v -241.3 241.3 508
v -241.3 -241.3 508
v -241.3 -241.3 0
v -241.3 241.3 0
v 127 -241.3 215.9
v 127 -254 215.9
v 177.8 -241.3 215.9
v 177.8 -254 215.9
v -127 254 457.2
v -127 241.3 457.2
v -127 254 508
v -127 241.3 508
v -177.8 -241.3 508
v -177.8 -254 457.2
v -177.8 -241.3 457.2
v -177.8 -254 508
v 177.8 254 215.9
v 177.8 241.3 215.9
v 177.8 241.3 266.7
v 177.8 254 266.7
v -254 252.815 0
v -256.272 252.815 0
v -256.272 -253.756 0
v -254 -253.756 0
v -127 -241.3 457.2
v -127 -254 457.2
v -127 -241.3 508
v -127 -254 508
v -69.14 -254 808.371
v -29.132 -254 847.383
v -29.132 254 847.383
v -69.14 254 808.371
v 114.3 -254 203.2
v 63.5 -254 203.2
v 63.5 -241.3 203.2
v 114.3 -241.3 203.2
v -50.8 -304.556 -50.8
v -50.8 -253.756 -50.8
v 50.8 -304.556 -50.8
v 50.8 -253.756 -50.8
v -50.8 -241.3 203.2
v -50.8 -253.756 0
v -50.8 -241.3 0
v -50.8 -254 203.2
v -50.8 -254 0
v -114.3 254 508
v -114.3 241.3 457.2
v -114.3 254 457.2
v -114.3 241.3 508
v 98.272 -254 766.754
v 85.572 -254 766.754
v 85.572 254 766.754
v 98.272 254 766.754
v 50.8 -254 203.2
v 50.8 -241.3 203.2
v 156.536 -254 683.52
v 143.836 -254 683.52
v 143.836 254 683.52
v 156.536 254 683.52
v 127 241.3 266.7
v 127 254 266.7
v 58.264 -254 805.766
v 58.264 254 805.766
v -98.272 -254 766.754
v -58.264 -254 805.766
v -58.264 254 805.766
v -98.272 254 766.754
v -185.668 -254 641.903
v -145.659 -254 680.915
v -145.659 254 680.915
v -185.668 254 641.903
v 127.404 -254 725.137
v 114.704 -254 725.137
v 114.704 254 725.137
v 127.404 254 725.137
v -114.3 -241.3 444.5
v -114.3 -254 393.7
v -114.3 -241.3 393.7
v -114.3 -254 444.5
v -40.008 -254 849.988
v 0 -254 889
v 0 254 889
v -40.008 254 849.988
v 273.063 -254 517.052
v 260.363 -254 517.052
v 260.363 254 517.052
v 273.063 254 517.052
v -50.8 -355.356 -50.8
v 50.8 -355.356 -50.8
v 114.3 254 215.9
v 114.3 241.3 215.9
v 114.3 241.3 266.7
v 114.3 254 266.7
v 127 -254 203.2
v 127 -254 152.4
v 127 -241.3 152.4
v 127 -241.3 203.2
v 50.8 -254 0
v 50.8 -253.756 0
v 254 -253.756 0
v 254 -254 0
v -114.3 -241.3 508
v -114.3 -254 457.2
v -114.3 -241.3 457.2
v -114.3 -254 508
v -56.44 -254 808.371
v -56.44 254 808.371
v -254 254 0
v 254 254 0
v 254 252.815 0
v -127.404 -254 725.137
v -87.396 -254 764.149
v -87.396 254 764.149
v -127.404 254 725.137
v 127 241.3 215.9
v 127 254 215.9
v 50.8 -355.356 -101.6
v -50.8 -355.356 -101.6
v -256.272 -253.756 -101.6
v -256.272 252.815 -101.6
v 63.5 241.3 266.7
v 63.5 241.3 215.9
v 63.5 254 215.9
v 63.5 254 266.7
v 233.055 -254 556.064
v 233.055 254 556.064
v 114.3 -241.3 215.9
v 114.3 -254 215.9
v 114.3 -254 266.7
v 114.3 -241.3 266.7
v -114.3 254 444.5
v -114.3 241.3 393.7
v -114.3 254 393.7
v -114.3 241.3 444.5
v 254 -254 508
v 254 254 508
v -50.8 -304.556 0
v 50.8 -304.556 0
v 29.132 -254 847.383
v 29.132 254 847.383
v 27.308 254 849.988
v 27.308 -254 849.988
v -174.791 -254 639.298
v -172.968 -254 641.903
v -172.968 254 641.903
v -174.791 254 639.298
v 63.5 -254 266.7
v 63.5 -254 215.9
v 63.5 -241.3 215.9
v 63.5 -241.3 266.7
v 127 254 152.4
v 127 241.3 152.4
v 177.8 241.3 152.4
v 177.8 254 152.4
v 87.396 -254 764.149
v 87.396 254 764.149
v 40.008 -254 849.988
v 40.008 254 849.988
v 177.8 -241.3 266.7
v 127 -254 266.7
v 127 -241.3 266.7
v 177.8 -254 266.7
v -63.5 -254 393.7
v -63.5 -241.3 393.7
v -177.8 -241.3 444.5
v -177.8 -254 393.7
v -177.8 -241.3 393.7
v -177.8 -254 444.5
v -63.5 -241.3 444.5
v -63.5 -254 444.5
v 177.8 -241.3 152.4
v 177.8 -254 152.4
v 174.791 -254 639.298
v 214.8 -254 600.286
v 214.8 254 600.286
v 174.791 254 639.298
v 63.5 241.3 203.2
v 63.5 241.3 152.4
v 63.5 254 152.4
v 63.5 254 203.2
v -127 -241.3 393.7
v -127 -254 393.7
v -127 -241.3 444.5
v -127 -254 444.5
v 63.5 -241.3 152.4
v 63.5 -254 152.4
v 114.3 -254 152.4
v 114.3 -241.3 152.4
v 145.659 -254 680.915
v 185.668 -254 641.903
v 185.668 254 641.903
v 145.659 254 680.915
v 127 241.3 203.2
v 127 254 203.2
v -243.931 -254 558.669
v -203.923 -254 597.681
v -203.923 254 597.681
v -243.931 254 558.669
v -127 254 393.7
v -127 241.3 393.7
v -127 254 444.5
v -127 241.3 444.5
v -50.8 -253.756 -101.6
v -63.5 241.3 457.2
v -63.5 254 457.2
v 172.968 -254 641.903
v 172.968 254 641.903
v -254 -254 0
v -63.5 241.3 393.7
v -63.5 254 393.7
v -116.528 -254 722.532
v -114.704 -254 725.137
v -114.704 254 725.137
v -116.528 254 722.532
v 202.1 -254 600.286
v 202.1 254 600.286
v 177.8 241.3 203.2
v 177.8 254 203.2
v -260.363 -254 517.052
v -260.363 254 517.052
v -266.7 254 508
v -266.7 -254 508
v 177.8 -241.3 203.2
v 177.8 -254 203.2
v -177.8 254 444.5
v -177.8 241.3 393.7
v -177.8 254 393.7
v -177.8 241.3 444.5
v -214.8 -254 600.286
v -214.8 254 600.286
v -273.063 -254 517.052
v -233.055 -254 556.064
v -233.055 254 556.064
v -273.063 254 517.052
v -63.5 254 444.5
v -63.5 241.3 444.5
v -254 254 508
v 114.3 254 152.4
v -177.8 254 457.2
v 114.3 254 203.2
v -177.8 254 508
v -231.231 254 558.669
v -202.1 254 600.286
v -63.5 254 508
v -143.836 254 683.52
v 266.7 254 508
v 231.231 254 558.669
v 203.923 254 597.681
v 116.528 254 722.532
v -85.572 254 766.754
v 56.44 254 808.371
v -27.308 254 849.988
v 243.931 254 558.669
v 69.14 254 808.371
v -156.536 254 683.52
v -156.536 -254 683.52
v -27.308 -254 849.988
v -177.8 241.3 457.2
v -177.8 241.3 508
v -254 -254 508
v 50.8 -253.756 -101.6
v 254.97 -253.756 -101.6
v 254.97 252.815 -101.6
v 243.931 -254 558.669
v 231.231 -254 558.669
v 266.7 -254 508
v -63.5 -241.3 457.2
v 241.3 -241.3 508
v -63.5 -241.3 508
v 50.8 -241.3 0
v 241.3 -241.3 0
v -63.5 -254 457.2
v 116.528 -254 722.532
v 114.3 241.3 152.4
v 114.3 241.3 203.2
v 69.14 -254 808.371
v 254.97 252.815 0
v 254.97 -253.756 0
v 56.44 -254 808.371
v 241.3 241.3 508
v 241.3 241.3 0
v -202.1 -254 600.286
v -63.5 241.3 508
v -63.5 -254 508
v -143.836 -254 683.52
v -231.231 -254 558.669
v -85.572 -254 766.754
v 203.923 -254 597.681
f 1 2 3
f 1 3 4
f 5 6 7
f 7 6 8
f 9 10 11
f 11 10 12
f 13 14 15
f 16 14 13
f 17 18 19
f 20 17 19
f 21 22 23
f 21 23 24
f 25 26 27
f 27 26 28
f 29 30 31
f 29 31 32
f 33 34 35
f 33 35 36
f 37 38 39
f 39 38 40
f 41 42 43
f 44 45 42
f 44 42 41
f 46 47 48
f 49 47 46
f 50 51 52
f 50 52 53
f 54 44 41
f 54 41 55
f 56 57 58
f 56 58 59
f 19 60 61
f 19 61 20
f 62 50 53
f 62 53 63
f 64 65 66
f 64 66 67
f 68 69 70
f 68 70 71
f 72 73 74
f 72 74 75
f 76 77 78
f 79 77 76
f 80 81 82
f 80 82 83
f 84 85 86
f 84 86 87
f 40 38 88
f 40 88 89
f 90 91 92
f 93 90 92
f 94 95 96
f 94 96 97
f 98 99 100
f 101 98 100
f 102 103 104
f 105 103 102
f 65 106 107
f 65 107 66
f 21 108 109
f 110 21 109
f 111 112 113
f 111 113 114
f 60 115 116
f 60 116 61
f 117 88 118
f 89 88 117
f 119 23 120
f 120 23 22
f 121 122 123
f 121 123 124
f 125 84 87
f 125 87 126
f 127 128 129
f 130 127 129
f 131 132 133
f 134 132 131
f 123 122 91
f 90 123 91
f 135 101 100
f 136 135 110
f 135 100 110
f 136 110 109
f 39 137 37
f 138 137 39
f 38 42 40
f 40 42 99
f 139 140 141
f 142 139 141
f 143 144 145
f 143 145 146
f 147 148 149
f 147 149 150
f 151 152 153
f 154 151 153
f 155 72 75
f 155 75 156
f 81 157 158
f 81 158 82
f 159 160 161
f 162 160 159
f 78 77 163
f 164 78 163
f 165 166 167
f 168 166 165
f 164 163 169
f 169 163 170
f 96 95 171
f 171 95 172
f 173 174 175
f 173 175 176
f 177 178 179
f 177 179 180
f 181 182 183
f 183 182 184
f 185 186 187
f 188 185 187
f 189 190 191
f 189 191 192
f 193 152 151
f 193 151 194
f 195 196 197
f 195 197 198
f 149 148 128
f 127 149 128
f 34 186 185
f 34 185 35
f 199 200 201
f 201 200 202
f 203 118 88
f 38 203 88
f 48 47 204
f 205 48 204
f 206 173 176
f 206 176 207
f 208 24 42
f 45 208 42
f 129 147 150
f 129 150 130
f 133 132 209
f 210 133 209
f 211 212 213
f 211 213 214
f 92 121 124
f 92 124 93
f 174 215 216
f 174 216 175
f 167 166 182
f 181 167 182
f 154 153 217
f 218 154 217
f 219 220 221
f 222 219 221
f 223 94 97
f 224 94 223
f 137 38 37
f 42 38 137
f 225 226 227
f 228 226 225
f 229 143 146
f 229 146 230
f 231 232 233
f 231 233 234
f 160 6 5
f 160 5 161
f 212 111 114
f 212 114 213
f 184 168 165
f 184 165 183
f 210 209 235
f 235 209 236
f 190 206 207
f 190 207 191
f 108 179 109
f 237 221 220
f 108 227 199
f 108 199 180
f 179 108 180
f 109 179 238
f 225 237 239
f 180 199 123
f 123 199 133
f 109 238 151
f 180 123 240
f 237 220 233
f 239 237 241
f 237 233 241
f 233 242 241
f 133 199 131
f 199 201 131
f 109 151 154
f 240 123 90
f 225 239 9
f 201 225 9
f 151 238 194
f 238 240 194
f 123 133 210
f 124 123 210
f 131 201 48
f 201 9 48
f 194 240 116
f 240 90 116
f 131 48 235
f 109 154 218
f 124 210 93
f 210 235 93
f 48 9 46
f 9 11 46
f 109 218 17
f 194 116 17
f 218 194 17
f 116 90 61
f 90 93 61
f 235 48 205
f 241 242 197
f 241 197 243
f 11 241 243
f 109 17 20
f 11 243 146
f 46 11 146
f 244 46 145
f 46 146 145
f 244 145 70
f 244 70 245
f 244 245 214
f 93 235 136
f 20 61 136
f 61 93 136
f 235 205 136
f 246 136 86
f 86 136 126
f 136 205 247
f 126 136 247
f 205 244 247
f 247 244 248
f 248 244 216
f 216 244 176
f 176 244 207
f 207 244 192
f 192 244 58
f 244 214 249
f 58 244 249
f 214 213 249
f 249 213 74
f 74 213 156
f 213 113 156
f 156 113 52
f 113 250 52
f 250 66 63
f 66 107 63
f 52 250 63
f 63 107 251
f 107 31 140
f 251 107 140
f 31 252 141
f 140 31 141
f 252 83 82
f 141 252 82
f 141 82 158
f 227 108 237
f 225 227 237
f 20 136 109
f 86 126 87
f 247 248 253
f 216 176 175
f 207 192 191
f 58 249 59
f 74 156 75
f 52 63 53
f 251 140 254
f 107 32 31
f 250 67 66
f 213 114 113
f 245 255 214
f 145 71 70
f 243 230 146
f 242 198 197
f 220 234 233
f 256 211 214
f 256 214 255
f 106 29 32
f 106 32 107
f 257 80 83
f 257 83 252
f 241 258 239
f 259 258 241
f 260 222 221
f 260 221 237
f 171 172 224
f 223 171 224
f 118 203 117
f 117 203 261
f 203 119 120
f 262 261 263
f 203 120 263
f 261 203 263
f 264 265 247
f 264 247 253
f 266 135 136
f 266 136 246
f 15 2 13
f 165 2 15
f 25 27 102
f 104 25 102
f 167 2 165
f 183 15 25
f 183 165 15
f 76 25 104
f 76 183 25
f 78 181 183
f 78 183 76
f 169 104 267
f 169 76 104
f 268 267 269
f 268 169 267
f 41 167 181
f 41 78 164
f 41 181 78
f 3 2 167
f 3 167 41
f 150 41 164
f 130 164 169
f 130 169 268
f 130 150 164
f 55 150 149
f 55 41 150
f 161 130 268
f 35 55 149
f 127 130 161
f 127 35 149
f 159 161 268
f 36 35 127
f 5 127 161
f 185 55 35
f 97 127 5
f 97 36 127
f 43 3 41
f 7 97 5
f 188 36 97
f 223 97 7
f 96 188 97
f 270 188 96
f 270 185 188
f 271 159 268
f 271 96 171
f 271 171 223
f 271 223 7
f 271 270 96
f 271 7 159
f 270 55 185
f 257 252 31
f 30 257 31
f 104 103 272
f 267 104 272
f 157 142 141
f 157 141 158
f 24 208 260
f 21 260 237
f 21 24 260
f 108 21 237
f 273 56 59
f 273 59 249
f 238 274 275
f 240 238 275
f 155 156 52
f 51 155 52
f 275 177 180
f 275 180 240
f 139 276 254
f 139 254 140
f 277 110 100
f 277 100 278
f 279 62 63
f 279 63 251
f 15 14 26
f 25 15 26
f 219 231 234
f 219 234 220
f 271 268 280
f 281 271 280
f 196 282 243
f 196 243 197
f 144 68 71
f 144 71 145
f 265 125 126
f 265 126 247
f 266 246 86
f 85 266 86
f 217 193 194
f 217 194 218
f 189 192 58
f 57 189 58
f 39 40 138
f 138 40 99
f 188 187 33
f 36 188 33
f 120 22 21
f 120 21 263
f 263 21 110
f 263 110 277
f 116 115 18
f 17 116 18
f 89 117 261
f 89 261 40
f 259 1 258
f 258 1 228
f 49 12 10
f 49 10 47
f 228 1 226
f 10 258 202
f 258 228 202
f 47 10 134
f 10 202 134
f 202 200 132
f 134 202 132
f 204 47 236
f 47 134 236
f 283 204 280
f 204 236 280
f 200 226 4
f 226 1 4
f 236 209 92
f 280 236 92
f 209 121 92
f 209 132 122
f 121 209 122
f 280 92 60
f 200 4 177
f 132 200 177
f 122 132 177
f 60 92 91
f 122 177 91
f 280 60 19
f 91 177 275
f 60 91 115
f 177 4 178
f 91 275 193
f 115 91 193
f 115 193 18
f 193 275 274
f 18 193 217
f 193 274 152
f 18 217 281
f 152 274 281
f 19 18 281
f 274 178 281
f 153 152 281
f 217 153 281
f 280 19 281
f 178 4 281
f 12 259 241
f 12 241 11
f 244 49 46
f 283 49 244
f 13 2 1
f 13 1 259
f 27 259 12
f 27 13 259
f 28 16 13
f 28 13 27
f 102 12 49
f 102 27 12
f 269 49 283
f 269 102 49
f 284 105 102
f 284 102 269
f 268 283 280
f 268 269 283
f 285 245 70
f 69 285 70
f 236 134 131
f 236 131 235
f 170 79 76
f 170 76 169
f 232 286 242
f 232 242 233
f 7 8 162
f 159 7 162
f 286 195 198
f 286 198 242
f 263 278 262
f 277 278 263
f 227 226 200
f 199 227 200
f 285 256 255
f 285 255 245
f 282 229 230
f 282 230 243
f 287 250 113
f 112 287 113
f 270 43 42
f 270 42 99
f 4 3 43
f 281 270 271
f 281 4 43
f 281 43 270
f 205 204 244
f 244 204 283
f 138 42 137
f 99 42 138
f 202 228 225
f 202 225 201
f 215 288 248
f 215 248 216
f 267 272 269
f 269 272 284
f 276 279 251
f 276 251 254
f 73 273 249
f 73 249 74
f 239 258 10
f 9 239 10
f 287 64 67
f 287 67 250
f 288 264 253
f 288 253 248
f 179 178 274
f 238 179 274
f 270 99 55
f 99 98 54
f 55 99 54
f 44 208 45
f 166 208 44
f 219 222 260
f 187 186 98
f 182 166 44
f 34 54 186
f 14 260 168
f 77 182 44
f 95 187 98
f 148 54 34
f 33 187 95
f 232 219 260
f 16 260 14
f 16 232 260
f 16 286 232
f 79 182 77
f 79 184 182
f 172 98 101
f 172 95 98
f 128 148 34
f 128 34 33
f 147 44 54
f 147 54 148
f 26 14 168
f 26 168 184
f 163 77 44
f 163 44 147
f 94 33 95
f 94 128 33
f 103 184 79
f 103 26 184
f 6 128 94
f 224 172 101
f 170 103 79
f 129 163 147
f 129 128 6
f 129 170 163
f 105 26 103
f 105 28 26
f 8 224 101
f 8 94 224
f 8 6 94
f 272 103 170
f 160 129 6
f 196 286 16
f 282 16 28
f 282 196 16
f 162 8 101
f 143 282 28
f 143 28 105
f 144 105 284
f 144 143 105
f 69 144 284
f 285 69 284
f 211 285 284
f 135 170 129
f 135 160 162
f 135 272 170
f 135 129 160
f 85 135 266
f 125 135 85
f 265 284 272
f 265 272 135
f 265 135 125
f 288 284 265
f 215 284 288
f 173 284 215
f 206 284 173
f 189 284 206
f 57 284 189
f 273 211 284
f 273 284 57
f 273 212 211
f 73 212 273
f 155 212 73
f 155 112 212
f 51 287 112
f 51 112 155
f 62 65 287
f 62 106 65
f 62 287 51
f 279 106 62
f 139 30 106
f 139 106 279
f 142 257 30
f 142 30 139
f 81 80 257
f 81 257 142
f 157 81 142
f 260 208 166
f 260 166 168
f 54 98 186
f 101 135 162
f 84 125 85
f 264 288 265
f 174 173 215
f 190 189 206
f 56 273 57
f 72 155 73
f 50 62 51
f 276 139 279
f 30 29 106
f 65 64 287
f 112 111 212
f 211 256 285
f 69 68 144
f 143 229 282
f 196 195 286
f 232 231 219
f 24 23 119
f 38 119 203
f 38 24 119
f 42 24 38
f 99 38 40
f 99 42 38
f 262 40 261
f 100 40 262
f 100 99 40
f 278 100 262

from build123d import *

# Parameters (mm, degrees)
F0_W      = 508
F0_H      = 508
F0_W_2    = 482.6000034809
F0_H_2    = 482.6000034809
F1_DEPTH  = 508
F3_DEPTH  = 508
F4_W      = 50.8
F4_H      = 50.8
F5_DEPTH  = 734.06
F6_W      = 101.6
F6_H      = 203.2
F7_DEPTH  = 25.4
F10_W     = 511.2411379814
F10_H     = 506.5713822842
F11_DEPTH = 101.6
F12_W     = 101.6
F12_H     = 50.8
F13_DEPTH = 101.6
F14_W     = 101.6
F14_H     = 50.8
F15_DEPTH = 50.8


# Not quite as in the source:
# - the program builds the solid bodies; features that only make, move or delete a surface that nothing else refers to are left out


with BuildPart() as f1:
    # F0 (on Top) → F1 (new body)
    with BuildSketch(Plane.XY):
        Rectangle(F0_W, F0_H)
        Rectangle(F0_W_2, F0_H_2, mode=Mode.SUBTRACT)
    extrude(amount=F1_DEPTH)

    # F2 (on face) → F3 (join)
    with BuildSketch(Plane.XZ.offset(254)):
        Polygon((-260.3633201527, 517.0523997819), (-266.7, 508), (266.7, 508), (260.3633201527, 517.0523997819), (273.0633201527, 517.0523997819), (233.0550967493, 556.0641475011), (231.231433059, 558.6693813443), (243.931433059, 558.6693813443), (203.9232096556, 597.6811290634), (202.0995459654, 600.2863629066), (214.7995459654, 600.2863629066), (174.7913225619, 639.2981106258), (172.9676588717, 641.903344469), (185.6676588717, 641.903344469), (145.6594354683, 680.9150921882), (143.835771778, 683.5203260314), (156.535771778, 683.5203260314), (116.5275483746, 722.5320737505), (114.7038846844, 725.1373075937), (127.4038846844, 725.1373075937), (87.395661281, 764.1490553129), (85.5719975907, 766.7542891561), (98.2719975907, 766.7542891561), (58.2637741873, 805.7660368753), (56.4401104971, 808.3712707185), (69.1401104971, 808.3712707185), (29.1318870937, 847.3830184376), (27.3082234034, 849.9882522808), (40.0082234034, 849.9882522808), (0, 889), (-40.0082234034, 849.9882522808), (-27.3082234034, 849.9882522808), (-29.1318870937, 847.3830184376), (-69.1401104971, 808.3712707185), (-56.4401104971, 808.3712707185), (-58.2637741873, 805.7660368753), (-98.2719975907, 766.7542891561), (-85.5719975907, 766.7542891561), (-87.395661281, 764.1490553129), (-127.4038846844, 725.1373075937), (-114.7038846844, 725.1373075937), (-116.5275483746, 722.5320737505), (-156.535771778, 683.5203260314), (-143.835771778, 683.5203260314), (-145.6594354683, 680.9150921882), (-185.6676588717, 641.903344469), (-172.9676588717, 641.903344469), (-174.7913225619, 639.2981106258), (-214.7995459654, 600.2863629066), (-202.0995459654, 600.2863629066), (-203.9232096556, 597.6811290634), (-243.931433059, 558.6693813443), (-231.231433059, 558.6693813443), (-233.0550967493, 556.0641475011), (-273.0633201527, 517.0523997819), align=None)
    extrude(amount=-F3_DEPTH)

    # F4 (on face) → F5 (cut)
    with BuildSketch(Plane.XZ.offset(254)):
        with Locations((-88.9, 482.6)):
            Rectangle(F4_W, F4_H)
        with Locations((-152.4, 419.1)):
            Rectangle(F4_W, F4_H)
        with Locations((-88.9, 419.1)):
            Rectangle(F4_W, F4_H)
        with Locations((-152.4, 482.6)):
            Rectangle(F4_W, F4_H)
        with Locations((152.4, 241.3)):
            Rectangle(F4_W, F4_H)
        with Locations((88.9, 177.8)):
            Rectangle(F4_W, F4_H)
        with Locations((152.4, 177.8)):
            Rectangle(F4_W, F4_H)
        with Locations((88.9, 241.3)):
            Rectangle(F4_W, F4_H)
    extrude(amount=-F5_DEPTH, mode=Mode.SUBTRACT)

    # F6 (on face) → F7 (cut)
    with BuildSketch(Plane.XZ.offset(254)):
        with Locations((0, 101.6)):
            Rectangle(F6_W, F6_H)
    extrude(amount=-F7_DEPTH, mode=Mode.SUBTRACT)

    # F10 (on Top) → F11 (join)
    with BuildSketch(Plane.XY):
        with Locations((-0.6510317326, -0.4706829786)):
            Rectangle(F10_W, F10_H)
    extrude(amount=-F11_DEPTH)

    # F12 (on face) → F13 (join)
    with BuildSketch(Plane.XZ.offset(253.7563741207)):
        with Locations((0, -76.2)):
            Rectangle(F12_W, F12_H)
    extrude(amount=F13_DEPTH)


with BuildPart() as f15:
    # F14 (on face) → F15 (new body)
    with BuildSketch(Plane.XZ.offset(253.7563741207)):
        with Locations((0, -25.4)):
            Rectangle(F14_W, F14_H)
    extrude(amount=F15_DEPTH)


solid = Compound([f1.part, f15.part])
